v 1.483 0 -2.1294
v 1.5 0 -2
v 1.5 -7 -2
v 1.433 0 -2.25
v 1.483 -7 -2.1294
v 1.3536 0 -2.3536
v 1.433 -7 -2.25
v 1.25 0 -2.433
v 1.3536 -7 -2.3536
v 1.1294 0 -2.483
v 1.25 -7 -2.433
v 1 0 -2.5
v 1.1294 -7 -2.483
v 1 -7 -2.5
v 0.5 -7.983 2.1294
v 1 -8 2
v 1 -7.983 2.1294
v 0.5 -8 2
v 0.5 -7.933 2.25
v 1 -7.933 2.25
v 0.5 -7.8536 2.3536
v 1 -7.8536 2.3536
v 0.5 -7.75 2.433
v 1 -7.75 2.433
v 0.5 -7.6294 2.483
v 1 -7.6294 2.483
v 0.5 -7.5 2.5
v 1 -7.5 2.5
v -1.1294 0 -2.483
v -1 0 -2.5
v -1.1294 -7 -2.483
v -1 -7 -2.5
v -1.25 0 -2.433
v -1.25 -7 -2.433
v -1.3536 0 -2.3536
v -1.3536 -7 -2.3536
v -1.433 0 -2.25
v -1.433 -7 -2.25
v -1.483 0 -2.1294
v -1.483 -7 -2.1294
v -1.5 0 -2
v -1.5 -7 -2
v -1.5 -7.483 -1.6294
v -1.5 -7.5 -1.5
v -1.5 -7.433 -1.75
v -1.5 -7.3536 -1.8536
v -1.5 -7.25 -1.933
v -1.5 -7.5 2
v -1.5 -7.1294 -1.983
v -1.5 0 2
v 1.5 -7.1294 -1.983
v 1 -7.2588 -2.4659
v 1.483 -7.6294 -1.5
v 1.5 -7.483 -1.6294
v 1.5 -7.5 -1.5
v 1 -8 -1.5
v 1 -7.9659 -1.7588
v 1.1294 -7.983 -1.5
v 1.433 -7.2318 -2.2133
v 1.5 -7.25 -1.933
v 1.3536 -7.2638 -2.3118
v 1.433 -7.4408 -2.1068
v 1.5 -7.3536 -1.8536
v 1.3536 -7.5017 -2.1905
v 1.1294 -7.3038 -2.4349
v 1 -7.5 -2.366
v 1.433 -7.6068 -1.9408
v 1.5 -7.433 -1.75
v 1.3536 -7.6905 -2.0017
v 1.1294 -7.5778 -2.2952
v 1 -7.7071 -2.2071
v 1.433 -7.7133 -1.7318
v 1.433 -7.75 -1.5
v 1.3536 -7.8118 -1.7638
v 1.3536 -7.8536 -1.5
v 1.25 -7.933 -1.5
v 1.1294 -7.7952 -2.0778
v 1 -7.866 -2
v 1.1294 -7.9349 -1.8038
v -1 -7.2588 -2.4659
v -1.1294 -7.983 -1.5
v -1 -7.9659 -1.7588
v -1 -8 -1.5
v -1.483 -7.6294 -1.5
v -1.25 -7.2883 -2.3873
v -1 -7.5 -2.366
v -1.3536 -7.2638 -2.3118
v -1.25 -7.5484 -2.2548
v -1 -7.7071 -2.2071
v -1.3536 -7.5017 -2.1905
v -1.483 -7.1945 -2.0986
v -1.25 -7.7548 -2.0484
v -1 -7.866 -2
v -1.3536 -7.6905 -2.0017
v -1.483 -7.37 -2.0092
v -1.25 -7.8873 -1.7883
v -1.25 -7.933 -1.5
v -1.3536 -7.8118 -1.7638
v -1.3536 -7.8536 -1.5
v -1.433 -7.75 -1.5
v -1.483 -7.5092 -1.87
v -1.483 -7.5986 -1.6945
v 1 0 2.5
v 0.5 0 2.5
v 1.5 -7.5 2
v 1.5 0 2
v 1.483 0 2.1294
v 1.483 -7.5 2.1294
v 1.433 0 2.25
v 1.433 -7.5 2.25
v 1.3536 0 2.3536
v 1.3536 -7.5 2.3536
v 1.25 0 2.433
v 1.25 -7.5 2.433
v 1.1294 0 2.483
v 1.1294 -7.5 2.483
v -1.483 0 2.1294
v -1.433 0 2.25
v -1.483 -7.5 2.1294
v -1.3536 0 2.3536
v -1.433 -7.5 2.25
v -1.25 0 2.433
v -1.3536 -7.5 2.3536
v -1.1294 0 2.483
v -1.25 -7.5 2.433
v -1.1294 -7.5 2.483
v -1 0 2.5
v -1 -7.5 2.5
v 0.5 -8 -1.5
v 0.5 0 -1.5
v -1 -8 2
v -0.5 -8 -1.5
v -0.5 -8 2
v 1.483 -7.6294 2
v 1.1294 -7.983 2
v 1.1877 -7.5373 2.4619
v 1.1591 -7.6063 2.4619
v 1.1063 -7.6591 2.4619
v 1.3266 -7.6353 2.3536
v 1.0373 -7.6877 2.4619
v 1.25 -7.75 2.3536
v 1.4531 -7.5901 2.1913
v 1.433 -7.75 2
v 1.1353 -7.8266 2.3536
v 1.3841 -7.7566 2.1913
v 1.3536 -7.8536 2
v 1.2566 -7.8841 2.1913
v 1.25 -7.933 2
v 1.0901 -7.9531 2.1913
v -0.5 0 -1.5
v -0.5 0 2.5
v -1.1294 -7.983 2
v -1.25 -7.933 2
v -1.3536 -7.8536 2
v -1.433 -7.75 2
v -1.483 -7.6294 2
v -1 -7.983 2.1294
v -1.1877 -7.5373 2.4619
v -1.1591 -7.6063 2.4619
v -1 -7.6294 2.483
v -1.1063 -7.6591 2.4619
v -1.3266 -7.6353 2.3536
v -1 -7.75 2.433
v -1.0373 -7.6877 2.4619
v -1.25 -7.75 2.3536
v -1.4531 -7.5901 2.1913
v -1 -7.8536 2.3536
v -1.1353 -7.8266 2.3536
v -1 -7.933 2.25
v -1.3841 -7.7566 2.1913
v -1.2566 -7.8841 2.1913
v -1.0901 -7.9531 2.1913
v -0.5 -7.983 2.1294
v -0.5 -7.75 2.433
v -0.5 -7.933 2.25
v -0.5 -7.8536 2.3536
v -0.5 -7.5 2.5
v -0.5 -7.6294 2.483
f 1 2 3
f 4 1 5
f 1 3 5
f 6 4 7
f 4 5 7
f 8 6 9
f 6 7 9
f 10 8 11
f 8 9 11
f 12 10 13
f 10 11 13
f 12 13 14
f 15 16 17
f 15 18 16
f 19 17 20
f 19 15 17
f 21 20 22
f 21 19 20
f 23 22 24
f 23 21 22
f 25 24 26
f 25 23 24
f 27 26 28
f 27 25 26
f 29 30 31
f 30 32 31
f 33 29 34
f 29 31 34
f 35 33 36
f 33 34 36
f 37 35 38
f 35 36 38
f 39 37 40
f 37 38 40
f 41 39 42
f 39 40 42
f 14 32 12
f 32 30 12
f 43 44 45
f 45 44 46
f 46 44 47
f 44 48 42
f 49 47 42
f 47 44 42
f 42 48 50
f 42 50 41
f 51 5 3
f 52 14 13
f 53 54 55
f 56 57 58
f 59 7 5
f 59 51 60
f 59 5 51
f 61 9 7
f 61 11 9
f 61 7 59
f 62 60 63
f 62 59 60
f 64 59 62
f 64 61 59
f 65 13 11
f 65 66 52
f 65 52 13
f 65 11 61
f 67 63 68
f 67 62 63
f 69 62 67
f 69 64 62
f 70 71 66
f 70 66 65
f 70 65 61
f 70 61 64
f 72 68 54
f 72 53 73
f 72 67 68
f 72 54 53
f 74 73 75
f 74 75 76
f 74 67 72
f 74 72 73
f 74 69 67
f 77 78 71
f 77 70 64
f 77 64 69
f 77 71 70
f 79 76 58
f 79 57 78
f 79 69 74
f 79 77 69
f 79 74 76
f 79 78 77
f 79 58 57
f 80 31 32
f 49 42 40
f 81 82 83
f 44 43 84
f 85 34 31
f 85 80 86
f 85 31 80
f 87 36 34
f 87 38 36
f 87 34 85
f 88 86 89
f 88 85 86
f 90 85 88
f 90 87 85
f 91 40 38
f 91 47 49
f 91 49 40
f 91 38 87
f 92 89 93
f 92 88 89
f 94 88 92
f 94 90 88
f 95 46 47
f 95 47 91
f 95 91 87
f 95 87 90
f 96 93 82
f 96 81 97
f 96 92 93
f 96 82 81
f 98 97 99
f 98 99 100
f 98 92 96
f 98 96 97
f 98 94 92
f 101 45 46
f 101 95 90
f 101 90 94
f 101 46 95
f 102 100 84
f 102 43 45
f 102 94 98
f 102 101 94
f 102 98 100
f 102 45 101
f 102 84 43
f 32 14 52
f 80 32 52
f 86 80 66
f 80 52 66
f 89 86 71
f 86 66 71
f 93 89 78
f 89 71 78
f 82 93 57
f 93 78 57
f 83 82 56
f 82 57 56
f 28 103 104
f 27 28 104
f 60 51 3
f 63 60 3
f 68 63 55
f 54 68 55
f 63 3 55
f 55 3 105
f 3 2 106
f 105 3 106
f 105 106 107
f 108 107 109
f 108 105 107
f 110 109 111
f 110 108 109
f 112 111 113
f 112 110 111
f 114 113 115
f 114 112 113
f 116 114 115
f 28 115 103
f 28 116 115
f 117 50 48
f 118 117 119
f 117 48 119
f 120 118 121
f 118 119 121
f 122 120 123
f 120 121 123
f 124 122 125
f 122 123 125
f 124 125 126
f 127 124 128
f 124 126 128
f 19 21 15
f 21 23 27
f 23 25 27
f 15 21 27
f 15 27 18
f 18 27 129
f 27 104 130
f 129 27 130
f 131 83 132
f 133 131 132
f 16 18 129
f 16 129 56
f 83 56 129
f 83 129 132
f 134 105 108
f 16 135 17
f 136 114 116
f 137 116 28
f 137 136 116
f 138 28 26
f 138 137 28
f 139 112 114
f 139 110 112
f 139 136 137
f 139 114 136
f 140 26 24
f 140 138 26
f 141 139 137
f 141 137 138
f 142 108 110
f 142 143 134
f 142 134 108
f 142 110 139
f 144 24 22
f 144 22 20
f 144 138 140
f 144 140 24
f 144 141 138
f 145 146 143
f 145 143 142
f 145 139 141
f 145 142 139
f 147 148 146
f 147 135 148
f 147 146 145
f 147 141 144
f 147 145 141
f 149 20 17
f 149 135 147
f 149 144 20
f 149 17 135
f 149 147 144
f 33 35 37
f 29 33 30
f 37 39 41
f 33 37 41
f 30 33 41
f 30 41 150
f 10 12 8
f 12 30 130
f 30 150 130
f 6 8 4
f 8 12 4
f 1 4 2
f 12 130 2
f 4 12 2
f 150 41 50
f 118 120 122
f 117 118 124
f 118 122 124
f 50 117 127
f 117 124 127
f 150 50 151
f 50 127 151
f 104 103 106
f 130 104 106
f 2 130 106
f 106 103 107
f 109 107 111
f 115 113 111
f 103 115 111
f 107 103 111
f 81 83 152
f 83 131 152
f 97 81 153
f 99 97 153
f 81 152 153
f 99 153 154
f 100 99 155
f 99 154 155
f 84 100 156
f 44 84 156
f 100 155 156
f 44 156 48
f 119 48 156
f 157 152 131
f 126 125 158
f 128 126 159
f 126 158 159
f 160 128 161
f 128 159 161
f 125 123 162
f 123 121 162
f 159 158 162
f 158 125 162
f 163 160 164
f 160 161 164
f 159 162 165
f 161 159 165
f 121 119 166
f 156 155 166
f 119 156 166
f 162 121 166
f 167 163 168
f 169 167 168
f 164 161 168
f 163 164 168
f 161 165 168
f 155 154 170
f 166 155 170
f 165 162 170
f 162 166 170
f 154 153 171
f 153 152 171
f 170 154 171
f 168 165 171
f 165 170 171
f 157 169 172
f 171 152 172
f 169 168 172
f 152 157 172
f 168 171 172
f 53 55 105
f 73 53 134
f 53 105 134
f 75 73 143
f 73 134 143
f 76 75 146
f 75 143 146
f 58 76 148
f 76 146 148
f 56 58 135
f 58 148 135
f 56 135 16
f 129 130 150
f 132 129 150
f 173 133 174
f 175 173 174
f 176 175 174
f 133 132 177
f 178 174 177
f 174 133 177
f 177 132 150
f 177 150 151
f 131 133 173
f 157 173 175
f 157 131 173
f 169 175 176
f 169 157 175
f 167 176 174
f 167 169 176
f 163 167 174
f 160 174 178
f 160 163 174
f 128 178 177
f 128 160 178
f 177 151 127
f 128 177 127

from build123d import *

# Parameters (mm, degrees)
F1_DEPTH = 8
F2_R     = 0.99999
F3_R     = 0.5


# Not quite as in the source:
# - a fillet or chamfer is up to 0.001 mm smaller than in the source, because OpenCascade refuses the exact size


with BuildPart() as f1:
    # F0 (on Front) → F1 (new body)
    with BuildSketch(Plane.XZ):
        Polygon((1.5, -2.5), (1.5, 2.5), (0.5, 2.5), (0.5, -1.5), (-0.5, -1.5), (-0.5, 2.5), (-1.5, 2.5), (-1.5, -2.5), align=None)
    extrude(amount=F1_DEPTH)

    # F2 (radius 1 in the source; OpenCascade refuses exactly that, so slightly less here)
    f2_edges = [f1.edges().sort_by_distance(p)[0] for p in [
        (0, -8, -2.5),
    ]]
    fillet(f2_edges, radius=F2_R)

    # F3
    f3_edges = [f1.edges().sort_by_distance(p)[0] for p in [
        (-1.5, -3.500005, -2.5),
        (1.5, -3.500005, -2.5),
        (1.5, -4, 2.5),
        (-1.5, -4, 2.5),
        (-1, -8, 2.5),
        (1, -8, 2.5),
    ]]
    fillet(f3_edges, radius=F3_R)


solid = f1.part
